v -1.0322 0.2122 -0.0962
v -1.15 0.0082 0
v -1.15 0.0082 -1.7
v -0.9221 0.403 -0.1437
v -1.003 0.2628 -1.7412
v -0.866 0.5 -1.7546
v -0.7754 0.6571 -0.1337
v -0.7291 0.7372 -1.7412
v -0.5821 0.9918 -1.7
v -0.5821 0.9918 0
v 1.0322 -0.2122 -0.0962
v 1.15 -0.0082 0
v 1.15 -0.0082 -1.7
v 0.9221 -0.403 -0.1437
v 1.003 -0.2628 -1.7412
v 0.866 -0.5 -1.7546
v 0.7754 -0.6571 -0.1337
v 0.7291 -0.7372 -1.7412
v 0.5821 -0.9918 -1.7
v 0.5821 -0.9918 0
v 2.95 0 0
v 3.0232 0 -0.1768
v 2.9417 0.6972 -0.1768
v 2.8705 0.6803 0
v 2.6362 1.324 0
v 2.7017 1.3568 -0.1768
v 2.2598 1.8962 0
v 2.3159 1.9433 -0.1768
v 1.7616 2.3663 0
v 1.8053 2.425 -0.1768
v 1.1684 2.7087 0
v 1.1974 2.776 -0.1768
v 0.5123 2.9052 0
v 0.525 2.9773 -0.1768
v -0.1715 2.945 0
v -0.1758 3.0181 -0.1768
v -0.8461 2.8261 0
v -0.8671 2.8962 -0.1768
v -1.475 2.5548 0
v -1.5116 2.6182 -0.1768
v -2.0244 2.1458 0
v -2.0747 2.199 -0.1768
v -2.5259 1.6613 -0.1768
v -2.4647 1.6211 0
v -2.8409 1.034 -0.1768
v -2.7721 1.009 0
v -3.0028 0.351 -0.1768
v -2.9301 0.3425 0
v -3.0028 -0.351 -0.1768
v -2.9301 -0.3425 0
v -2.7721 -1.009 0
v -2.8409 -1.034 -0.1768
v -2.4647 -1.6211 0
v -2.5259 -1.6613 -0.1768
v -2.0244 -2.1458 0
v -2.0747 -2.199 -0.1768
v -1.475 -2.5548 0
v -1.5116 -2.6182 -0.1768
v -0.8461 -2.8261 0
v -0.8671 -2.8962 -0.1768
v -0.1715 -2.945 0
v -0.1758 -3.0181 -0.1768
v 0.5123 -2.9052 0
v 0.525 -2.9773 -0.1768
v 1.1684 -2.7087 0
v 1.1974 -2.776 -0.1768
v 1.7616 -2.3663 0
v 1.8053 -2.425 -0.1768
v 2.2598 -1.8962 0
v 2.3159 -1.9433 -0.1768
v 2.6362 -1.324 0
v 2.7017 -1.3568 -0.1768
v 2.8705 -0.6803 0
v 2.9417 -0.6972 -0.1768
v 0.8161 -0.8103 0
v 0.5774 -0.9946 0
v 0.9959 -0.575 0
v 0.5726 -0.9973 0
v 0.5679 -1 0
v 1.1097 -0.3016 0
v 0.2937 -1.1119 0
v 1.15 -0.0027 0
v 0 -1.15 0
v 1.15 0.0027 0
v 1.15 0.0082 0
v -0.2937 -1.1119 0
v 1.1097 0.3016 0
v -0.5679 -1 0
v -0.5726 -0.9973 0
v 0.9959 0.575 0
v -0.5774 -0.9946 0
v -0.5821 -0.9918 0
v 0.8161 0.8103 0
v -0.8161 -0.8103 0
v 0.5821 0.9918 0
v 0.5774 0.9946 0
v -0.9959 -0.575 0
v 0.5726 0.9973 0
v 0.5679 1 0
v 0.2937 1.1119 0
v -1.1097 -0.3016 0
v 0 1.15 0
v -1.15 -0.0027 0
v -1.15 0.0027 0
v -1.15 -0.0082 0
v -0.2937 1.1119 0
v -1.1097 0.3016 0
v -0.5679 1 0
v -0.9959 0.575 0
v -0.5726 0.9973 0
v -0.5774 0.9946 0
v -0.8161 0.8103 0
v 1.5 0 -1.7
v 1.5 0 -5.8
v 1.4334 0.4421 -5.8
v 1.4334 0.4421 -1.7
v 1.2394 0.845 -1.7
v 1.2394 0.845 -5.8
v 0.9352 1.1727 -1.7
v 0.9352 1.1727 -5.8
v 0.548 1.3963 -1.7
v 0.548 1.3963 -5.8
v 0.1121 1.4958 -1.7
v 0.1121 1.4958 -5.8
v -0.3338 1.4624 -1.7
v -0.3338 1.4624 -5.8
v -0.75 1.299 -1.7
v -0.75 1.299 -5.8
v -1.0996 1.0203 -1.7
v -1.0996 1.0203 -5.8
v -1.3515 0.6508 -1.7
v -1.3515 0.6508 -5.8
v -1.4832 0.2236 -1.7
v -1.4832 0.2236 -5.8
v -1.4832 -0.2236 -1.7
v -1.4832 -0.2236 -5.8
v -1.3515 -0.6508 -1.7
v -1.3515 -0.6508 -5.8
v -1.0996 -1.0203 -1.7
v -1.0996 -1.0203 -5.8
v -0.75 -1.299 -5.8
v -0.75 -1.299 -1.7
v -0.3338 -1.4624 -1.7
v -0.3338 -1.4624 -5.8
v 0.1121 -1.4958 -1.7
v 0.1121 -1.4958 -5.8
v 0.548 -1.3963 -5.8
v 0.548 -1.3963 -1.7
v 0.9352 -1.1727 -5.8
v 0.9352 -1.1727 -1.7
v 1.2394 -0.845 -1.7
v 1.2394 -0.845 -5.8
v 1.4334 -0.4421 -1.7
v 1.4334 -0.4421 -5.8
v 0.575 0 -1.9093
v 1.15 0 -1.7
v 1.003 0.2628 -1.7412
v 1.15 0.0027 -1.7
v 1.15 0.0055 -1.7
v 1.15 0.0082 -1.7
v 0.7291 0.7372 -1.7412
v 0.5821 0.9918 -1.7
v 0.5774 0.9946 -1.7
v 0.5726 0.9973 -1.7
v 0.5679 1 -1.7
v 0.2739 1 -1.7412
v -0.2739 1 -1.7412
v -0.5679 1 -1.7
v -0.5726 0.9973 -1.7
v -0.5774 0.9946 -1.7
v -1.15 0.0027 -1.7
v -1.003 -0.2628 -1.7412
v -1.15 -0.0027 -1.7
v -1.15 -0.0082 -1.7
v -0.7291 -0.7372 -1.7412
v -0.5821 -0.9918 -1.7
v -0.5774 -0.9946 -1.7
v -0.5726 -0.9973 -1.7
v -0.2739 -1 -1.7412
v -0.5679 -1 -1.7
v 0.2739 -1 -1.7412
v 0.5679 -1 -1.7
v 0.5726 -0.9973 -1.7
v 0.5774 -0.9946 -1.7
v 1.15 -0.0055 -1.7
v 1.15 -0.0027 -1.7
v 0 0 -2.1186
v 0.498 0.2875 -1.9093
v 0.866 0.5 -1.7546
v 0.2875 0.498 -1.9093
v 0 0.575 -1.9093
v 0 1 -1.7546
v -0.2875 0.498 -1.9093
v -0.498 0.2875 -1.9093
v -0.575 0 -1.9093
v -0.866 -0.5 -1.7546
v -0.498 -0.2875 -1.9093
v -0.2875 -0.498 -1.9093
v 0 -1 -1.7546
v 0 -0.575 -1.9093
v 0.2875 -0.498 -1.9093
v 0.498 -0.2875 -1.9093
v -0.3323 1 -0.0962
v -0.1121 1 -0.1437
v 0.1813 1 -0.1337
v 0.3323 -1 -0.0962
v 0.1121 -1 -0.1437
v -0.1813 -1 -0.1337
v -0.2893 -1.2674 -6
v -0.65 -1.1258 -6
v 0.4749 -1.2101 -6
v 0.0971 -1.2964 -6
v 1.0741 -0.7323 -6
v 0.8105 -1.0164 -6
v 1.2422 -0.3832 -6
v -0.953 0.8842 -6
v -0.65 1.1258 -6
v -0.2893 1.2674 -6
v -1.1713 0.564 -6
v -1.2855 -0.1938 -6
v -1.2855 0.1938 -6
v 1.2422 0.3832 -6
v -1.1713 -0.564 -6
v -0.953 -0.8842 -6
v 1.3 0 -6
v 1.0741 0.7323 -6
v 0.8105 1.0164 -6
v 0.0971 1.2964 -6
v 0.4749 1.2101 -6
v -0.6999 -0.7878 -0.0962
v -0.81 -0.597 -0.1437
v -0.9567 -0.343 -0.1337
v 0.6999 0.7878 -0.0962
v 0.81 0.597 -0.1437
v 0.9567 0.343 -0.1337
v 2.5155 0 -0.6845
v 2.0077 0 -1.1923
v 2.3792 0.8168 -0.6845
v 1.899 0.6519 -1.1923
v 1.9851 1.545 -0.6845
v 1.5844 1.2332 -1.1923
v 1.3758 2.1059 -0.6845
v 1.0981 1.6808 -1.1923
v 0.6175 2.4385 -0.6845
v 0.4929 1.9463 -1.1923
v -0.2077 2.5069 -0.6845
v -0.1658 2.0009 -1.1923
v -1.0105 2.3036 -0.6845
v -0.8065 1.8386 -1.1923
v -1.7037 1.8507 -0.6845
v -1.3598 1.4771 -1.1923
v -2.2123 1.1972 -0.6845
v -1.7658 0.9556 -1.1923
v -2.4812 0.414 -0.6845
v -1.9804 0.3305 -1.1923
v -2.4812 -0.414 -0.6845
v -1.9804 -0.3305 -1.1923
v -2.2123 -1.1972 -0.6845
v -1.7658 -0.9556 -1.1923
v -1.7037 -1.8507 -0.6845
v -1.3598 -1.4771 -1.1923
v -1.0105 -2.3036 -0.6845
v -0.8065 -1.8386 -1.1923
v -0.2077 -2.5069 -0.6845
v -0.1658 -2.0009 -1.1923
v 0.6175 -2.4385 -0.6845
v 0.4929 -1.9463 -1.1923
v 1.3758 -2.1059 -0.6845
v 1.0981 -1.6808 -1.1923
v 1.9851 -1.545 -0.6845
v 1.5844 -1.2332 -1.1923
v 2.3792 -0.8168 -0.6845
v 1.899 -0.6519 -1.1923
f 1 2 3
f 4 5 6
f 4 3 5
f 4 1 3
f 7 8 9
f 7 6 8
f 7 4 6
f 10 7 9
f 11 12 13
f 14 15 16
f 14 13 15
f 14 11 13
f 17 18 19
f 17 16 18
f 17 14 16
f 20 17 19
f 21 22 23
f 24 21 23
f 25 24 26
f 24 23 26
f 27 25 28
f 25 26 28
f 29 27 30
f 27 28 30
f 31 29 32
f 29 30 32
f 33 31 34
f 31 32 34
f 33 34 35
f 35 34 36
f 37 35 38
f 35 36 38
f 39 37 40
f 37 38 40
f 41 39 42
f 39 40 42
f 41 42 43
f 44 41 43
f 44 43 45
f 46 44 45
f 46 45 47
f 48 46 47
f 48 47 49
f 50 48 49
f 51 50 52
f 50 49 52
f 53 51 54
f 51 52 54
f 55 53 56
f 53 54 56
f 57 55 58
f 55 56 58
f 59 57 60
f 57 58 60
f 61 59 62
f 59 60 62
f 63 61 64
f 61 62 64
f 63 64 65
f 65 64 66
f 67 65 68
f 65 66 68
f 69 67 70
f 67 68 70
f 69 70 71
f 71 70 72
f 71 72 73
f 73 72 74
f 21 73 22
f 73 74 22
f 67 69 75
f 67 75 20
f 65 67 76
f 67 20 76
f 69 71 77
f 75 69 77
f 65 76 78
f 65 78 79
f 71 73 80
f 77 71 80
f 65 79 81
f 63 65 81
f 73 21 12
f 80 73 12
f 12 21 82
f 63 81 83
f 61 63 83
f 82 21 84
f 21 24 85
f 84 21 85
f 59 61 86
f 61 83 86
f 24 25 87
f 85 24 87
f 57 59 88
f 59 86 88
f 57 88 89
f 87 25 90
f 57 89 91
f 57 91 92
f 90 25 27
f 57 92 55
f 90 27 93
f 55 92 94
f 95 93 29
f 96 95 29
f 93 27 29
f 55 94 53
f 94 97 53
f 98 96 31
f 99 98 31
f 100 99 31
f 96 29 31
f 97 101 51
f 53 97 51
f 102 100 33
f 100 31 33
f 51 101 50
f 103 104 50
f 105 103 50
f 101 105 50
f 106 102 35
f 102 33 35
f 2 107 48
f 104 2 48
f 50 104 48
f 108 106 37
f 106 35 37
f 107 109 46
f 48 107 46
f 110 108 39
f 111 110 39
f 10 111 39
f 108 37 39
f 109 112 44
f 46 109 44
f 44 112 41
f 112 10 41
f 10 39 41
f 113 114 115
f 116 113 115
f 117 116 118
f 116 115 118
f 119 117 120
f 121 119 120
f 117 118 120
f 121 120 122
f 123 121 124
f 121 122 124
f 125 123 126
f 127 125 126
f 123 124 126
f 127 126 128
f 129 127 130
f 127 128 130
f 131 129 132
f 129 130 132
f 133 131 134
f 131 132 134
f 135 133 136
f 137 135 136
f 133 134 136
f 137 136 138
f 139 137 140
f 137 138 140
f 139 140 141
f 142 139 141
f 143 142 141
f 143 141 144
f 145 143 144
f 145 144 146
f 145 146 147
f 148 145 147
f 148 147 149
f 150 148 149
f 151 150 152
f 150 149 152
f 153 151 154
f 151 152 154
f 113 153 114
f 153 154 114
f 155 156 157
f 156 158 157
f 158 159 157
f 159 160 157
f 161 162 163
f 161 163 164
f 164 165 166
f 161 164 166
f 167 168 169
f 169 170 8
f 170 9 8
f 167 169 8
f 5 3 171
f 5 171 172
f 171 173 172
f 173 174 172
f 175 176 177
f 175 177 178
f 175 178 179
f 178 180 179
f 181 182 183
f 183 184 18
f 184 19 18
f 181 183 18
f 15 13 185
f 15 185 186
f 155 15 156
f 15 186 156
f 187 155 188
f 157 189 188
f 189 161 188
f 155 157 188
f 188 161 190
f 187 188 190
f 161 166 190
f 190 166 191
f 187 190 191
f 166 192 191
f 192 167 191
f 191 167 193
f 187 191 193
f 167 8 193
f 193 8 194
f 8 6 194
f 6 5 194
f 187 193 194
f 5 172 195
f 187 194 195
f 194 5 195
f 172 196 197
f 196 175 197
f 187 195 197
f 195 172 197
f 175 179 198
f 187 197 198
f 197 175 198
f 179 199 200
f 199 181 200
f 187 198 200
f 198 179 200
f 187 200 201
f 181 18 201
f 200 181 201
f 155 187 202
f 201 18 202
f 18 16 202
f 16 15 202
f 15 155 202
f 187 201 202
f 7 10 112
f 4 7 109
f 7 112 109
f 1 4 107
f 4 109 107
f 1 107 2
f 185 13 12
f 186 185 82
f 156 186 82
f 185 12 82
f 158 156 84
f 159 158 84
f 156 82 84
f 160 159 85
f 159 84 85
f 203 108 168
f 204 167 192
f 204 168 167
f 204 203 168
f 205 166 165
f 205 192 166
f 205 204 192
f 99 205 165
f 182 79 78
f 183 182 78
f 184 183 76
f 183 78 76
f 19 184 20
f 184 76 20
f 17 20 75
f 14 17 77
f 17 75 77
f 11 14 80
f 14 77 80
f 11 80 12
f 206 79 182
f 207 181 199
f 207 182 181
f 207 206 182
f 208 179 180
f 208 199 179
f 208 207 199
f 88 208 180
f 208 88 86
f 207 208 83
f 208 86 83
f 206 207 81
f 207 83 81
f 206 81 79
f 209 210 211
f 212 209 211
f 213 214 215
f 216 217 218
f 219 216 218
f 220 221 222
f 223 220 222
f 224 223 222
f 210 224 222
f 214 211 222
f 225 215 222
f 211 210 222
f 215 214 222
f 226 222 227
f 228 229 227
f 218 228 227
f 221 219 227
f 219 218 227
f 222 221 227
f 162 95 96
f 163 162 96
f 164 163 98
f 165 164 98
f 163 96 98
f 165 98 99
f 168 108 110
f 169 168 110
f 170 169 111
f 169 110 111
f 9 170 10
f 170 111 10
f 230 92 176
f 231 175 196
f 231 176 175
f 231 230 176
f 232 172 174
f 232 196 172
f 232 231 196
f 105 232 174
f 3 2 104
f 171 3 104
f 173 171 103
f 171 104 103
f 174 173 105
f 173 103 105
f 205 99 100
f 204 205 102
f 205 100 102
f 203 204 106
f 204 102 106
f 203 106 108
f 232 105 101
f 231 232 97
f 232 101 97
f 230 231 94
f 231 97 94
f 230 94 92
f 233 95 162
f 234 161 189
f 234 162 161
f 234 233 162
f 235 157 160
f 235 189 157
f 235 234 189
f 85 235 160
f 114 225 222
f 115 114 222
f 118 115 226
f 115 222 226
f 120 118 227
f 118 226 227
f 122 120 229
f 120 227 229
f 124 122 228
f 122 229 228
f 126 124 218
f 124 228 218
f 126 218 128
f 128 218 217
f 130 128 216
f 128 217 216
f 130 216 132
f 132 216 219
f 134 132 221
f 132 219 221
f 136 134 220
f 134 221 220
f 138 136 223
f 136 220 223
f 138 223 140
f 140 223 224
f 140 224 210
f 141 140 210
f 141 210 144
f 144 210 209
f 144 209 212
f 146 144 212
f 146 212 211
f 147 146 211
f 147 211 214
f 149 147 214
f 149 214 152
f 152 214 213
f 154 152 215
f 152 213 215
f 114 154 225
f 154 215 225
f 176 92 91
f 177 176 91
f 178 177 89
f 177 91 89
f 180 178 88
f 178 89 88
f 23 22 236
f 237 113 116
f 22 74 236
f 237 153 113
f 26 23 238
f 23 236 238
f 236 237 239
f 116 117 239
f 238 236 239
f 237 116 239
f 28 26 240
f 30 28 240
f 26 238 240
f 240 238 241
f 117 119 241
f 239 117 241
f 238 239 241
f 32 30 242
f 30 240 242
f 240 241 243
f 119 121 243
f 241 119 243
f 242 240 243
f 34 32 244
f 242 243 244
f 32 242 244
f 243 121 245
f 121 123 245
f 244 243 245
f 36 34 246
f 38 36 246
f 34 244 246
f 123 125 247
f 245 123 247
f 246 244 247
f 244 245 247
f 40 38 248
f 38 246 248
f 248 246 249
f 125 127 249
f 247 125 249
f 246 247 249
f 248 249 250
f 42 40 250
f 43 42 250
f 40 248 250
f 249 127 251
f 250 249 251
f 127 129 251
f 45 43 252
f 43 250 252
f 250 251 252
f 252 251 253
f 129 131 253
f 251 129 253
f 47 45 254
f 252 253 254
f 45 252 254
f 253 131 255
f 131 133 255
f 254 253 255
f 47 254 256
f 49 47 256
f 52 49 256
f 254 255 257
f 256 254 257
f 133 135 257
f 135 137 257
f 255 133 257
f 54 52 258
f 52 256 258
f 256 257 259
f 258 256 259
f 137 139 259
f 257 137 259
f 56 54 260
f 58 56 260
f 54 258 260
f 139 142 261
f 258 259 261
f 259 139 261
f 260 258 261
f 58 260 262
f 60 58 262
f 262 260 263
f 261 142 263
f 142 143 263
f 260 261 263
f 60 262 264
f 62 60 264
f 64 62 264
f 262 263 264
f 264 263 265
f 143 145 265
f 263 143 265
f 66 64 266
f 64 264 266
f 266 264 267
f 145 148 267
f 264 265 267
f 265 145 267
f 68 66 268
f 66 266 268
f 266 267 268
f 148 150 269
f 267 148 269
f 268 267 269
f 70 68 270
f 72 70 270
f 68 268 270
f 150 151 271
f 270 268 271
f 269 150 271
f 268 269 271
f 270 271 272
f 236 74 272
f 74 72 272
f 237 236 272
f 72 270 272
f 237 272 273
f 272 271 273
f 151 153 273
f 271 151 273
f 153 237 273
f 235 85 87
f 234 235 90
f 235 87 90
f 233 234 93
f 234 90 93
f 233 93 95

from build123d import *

# Parameters (mm, degrees)
SKETCH001_R     = 2.15
POCKET_DEPTH    = 3.119566
CHAMFER_SIZE    = 0.25
CHAMFER001_SIZE = 0.2


with BuildPart() as pocket:
    # Sketch003 → Revolution001 (revolve)
    with BuildSketch(Plane.XZ):
        Polygon((0, -2.118566), (1.15, -1.7), (1.15, 1), (0, 1), align=None)
    revolve(axis=Axis((0, 0, 0), (0, 0, 1)))

    # Sketch001 → Pocket (cut, through all)
    with BuildSketch(Plane(origin=(0, 0, 1), x_dir=(-1, 0, 0), z_dir=(0, 0, 1))):
        Circle(SKETCH001_R)
        Polygon((-0.57735, 1), (0.57735, 1), (1.154701, 0), (0.57735, -1), (-0.57735, -1), (-1.154701, 0), align=None, mode=Mode.SUBTRACT)
    extrude(amount=-POCKET_DEPTH, mode=Mode.SUBTRACT)


with BuildPart() as chamfer001:
    # Sketch → Revolution (revolve)
    with BuildSketch(Plane.XZ):
        Polygon((1.15, 0), (3.199999, 0), (1.5, -1.7), (1.5, -6), (0, -6), (0, -1.150001), align=None)
    revolve(axis=Axis((0, 0, 0), (0, 0, 1)))

    # Cut: cut Pocket
    add(pocket.part, mode=Mode.SUBTRACT)

    # Chamfer
    chamfer_edges = [chamfer001.edges().sort_by_distance(p)[0] for p in [
        (-3.199999, 0, 0),
    ]]
    chamfer(chamfer_edges, length=CHAMFER_SIZE)

    # Chamfer001
    chamfer001_edges = [chamfer001.edges().sort_by_distance(p)[0] for p in [
        (-1.5, 0, -6),
    ]]
    chamfer(chamfer001_edges, length=CHAMFER001_SIZE)


solid = chamfer001.part
